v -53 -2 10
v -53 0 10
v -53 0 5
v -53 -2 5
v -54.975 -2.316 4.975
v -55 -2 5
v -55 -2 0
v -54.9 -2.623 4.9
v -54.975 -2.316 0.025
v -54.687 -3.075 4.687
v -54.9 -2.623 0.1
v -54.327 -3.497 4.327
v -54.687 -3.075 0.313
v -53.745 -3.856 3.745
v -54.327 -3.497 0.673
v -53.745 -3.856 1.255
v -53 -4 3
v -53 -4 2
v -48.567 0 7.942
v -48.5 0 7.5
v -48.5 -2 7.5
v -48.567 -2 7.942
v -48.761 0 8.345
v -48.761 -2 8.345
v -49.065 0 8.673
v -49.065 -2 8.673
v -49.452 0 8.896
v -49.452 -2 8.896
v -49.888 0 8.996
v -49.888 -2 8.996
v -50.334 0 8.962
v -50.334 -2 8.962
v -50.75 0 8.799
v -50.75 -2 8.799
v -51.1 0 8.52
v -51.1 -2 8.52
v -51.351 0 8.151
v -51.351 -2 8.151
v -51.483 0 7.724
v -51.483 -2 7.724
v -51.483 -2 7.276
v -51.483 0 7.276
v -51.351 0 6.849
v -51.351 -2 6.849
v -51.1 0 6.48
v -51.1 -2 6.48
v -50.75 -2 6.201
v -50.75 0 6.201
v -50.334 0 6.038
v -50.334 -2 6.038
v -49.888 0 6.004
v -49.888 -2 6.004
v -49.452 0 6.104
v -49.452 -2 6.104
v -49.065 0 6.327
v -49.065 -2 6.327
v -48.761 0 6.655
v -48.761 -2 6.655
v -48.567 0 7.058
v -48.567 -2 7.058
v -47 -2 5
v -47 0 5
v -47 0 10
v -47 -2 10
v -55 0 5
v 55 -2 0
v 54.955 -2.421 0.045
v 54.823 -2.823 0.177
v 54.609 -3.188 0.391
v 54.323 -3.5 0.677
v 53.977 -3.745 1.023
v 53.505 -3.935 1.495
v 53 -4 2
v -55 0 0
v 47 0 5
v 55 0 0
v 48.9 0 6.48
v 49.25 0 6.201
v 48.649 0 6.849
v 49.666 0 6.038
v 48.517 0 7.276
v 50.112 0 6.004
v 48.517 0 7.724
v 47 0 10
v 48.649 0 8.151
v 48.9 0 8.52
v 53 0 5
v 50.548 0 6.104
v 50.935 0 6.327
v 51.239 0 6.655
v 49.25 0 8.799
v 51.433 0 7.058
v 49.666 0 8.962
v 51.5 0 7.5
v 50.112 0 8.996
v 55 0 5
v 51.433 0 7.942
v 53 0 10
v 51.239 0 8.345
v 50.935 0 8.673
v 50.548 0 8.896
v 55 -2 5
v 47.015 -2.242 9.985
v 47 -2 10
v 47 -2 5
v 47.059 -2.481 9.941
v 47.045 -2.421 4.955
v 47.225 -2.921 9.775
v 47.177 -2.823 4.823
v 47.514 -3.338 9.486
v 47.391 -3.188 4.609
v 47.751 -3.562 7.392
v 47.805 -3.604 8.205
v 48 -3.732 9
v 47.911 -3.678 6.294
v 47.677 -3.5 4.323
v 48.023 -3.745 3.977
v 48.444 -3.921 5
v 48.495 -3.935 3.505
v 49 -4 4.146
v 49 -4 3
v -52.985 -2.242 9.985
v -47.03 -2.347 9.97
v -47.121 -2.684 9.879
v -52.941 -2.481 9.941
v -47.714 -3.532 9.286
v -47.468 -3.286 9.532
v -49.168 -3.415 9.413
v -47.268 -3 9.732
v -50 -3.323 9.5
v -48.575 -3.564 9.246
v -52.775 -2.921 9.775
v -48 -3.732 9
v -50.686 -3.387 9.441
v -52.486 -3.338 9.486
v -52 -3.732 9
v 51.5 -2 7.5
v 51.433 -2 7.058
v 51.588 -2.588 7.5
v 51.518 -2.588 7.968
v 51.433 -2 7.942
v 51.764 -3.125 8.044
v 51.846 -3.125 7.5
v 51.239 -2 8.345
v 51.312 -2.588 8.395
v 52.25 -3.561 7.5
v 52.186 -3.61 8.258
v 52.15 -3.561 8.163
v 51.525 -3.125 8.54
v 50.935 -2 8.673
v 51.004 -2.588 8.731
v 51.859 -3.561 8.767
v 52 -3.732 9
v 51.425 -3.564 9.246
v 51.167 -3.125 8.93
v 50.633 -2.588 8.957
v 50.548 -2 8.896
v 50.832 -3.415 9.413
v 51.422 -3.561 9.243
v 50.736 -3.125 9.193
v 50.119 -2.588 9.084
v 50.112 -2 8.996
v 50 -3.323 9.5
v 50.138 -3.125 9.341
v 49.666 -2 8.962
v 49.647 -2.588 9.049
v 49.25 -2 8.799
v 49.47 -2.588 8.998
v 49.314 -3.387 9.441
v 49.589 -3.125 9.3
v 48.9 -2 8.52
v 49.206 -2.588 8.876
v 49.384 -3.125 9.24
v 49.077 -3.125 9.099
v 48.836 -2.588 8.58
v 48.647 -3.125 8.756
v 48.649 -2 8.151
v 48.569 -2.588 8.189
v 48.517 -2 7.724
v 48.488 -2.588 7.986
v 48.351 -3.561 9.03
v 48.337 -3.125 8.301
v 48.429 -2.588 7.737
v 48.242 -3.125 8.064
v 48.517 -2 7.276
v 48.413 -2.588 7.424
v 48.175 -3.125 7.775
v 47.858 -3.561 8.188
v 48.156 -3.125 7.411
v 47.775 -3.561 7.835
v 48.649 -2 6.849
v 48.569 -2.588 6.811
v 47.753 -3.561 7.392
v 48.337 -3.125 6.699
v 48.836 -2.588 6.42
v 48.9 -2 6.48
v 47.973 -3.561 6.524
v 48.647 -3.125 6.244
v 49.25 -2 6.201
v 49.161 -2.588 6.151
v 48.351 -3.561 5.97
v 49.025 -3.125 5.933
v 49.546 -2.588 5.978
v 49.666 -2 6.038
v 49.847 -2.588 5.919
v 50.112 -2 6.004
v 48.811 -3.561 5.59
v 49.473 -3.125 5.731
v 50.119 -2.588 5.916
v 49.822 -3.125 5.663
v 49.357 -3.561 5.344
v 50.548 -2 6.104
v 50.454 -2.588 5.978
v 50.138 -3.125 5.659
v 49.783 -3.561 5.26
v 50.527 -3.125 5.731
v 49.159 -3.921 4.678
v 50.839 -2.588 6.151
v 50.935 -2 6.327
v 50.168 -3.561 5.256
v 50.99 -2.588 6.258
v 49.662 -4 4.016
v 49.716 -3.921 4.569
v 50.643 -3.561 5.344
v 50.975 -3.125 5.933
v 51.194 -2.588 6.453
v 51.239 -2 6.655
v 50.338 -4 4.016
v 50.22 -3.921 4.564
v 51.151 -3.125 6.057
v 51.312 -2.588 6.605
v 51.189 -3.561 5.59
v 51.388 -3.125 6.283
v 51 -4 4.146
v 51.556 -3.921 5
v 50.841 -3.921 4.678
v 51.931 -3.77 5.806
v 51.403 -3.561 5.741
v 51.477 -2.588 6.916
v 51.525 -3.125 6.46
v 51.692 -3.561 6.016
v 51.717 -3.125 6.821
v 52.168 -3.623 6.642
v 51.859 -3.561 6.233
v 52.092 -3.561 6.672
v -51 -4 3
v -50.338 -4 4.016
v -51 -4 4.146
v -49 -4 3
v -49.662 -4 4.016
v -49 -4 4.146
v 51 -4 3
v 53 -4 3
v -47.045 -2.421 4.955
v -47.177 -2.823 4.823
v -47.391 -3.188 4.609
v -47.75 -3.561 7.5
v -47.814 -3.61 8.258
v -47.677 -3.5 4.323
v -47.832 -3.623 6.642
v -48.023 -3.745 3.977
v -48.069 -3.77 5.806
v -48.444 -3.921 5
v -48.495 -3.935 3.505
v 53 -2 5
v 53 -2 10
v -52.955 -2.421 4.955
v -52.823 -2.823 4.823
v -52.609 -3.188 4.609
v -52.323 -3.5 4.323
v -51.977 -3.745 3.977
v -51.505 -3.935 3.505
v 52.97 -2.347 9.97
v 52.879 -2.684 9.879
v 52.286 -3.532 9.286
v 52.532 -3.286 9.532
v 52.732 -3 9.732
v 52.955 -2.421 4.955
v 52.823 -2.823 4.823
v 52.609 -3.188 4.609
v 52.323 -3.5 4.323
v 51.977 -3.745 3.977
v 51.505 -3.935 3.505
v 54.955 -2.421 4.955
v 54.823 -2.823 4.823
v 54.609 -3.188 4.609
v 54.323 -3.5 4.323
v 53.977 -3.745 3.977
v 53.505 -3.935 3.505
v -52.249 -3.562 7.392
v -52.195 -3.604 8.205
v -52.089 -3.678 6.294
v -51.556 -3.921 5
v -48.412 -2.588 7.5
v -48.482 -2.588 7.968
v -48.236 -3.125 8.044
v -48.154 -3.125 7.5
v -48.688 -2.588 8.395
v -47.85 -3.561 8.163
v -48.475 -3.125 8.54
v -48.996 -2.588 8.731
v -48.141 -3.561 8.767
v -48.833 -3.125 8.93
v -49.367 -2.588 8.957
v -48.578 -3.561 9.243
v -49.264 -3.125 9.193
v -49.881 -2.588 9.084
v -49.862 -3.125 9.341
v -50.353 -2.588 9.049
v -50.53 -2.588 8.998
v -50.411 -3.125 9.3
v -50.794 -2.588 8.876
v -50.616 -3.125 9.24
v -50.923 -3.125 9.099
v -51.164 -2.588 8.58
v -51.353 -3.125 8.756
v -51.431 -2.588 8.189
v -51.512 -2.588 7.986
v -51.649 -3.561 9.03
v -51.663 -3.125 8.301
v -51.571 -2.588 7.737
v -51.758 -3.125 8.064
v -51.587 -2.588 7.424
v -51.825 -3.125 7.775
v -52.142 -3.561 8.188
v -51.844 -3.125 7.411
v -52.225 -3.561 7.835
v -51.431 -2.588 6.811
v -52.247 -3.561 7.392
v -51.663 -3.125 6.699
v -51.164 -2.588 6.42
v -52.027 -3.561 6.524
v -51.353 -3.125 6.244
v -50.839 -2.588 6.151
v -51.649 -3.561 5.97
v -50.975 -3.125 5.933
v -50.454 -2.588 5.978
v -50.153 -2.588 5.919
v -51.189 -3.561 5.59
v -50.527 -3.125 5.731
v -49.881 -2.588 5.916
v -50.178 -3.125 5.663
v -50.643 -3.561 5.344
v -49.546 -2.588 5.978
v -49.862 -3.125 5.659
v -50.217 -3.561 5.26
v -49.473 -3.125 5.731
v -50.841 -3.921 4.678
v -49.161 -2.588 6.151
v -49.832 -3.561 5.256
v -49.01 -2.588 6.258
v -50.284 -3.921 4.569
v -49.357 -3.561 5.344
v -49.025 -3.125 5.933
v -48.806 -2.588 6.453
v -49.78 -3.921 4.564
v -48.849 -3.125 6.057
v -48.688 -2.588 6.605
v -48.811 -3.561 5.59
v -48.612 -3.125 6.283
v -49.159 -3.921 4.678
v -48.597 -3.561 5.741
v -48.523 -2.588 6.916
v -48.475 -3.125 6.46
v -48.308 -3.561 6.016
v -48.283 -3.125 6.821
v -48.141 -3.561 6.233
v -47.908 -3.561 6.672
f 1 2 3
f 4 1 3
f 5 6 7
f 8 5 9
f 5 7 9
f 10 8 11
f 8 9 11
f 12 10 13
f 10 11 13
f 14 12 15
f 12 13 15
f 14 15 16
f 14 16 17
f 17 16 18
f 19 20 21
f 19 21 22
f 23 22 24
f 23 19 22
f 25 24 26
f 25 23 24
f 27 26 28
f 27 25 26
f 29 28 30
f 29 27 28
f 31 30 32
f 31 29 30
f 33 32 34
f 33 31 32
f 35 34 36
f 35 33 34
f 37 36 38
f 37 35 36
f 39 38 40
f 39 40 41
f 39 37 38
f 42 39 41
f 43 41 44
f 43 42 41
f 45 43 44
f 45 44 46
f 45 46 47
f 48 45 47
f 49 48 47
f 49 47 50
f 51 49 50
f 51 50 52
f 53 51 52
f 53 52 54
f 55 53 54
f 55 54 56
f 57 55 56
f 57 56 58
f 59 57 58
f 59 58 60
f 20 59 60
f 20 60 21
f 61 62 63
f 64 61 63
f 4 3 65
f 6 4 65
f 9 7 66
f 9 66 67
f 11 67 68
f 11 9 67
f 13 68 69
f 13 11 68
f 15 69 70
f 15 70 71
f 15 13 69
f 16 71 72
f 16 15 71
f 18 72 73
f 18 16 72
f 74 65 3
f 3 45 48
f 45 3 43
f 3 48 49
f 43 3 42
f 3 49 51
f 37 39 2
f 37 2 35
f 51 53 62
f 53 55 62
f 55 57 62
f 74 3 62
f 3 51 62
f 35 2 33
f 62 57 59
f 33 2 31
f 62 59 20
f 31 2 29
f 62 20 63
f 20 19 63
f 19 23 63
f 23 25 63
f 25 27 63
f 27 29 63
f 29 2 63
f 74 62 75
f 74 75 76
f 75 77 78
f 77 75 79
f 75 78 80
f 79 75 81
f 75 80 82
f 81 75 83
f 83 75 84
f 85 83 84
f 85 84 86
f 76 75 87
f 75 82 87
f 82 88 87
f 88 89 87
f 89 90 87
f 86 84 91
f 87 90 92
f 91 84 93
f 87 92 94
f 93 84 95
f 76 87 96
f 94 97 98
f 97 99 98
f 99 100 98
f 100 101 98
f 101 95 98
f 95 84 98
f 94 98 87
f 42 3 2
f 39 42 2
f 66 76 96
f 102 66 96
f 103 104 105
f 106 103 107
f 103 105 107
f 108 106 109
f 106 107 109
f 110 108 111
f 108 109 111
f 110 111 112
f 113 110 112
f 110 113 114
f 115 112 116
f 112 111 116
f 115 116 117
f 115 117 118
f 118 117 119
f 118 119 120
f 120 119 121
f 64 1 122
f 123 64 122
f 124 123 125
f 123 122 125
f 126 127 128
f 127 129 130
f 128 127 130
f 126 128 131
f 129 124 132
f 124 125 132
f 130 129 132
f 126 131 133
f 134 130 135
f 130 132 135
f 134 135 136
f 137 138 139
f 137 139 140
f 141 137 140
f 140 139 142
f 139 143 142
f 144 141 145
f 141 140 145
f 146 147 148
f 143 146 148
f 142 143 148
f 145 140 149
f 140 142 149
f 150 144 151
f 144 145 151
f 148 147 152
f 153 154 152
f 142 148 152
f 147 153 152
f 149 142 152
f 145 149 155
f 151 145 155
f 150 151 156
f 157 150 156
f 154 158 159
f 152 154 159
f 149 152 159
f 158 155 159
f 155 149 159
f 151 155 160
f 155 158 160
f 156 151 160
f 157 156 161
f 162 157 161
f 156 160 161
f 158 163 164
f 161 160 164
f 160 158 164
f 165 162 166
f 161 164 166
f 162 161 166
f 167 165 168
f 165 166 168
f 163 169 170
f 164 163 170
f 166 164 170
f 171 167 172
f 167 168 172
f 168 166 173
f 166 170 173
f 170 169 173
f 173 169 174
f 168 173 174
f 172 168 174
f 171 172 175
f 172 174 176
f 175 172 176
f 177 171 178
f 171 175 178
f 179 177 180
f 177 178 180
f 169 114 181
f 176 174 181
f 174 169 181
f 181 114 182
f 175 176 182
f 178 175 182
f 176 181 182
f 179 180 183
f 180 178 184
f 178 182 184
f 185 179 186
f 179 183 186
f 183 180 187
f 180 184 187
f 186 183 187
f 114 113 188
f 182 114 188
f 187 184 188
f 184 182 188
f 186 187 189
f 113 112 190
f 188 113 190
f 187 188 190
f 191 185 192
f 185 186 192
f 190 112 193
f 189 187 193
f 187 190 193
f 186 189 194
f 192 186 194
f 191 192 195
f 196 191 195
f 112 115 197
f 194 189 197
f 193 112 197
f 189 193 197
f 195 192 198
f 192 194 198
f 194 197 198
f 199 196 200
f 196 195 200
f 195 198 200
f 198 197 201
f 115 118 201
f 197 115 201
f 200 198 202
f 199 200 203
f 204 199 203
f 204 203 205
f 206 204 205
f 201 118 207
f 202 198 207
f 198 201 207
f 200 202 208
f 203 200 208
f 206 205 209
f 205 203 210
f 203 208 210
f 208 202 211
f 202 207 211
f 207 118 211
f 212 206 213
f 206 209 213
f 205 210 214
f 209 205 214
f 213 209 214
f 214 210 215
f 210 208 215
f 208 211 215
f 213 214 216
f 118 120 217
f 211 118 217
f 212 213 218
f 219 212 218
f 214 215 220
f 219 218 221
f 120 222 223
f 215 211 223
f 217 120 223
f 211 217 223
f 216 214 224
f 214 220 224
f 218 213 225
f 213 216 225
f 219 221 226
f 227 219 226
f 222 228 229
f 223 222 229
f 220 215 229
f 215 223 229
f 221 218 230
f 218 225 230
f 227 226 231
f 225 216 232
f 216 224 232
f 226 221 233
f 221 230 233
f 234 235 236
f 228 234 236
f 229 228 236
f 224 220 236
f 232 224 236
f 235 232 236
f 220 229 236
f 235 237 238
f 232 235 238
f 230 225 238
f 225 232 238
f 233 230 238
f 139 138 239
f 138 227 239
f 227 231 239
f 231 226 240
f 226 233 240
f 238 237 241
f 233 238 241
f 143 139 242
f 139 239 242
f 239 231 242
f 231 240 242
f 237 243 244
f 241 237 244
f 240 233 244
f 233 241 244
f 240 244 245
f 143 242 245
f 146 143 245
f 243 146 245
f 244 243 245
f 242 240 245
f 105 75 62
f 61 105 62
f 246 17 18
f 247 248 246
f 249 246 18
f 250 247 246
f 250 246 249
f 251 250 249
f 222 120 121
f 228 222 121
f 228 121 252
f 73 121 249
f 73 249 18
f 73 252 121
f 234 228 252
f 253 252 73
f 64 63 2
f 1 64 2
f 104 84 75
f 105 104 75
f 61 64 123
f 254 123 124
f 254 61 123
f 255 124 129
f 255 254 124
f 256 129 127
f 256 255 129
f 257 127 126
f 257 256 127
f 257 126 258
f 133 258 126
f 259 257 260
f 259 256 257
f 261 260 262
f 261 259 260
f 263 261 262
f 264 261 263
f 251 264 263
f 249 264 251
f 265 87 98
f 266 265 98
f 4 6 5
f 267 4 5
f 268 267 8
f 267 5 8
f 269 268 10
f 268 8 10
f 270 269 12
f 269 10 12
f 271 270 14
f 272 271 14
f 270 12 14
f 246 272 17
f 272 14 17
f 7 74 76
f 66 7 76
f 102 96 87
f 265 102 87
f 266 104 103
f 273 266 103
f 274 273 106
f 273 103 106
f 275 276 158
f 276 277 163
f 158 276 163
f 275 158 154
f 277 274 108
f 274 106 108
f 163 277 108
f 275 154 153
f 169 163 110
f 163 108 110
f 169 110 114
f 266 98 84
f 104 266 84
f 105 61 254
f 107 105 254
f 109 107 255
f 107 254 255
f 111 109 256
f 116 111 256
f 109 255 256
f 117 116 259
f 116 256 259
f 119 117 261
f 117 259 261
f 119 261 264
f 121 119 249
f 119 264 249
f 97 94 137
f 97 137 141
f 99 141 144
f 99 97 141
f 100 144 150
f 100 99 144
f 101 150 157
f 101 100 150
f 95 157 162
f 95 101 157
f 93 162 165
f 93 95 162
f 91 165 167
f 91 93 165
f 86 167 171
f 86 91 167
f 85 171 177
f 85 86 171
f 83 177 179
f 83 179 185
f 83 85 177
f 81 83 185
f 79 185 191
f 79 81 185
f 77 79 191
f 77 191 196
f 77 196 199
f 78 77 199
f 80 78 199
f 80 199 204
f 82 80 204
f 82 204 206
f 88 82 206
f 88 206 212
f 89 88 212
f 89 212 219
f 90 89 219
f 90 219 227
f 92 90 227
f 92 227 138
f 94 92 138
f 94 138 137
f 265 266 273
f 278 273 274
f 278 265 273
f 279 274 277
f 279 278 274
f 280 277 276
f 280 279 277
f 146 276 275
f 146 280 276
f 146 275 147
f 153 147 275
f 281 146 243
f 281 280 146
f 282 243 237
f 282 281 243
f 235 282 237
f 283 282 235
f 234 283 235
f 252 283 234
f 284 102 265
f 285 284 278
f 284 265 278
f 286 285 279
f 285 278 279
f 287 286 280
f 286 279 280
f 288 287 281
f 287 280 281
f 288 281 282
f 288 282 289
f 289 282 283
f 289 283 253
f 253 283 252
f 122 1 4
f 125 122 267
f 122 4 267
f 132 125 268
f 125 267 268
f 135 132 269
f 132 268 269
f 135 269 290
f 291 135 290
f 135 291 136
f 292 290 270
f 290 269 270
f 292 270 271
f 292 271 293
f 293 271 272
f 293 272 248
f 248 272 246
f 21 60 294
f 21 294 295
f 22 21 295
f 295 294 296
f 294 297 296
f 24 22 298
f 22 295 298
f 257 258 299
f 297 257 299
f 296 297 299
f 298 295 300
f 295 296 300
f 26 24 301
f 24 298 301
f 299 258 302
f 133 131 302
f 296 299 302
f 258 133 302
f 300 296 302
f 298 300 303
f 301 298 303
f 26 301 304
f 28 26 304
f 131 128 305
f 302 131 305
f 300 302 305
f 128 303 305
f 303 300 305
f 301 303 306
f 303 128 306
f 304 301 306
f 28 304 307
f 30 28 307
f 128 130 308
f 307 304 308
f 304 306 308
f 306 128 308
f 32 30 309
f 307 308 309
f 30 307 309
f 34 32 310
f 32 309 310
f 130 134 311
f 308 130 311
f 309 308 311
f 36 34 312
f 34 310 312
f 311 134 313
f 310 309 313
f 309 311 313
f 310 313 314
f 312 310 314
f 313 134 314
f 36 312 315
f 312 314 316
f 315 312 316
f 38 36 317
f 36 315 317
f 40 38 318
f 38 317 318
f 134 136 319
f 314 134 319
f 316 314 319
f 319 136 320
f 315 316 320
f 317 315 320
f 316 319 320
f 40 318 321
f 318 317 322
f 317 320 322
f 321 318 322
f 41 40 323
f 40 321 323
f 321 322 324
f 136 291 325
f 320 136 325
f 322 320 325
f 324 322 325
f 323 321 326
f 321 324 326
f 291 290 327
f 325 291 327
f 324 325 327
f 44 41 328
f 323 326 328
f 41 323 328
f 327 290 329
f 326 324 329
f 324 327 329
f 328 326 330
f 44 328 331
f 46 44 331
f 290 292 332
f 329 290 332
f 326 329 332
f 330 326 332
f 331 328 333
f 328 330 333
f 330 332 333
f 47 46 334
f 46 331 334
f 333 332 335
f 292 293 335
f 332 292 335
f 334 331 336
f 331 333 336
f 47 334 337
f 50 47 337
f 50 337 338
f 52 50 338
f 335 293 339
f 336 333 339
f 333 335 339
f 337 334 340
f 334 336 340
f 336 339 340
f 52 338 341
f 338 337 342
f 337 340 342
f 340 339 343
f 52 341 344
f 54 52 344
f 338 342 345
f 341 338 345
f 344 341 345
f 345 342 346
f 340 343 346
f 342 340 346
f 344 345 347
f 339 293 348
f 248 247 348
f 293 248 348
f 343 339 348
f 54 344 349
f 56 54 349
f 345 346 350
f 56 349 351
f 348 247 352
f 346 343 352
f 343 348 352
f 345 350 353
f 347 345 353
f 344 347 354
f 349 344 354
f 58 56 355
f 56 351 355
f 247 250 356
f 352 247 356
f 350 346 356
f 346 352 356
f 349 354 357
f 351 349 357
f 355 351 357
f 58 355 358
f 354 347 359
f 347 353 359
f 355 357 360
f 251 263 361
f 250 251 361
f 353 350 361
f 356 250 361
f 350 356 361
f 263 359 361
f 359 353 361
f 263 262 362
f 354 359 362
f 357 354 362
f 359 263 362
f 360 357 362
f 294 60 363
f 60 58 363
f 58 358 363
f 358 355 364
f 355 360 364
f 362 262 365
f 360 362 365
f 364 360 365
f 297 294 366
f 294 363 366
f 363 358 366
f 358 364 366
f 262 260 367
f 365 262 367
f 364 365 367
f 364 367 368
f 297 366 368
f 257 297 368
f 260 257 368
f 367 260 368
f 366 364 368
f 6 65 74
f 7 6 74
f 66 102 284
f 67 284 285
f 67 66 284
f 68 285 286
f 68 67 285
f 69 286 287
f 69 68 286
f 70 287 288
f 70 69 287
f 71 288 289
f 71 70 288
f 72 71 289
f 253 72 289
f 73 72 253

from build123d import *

# Parameters (mm, degrees)
F0_R         = 1.5
F1_DEPTH     = 4
F2_T1_DEPTH  = 15
F2_T3_DEPTH  = 120
F2_T5_DEPTH  = 7
F2_T7_DEPTH  = 10
F2_T9_DEPTH  = 16
F2_T11_DEPTH = 94
F2_T13_DEPTH = 16
F2_T15_DEPTH = 7
F2_T25_DEPTH = 12
F2_T29_DEPTH = 15
F2_T36_DEPTH = 15
F2_T40_DEPTH = 99
F2_T47_DEPTH = 99
F2_T51_DEPTH = 15
F2_T58_DEPTH = 15
F2_T62_DEPTH = 12


# Not quite as in the source:
# - a fillet or chamfer that OpenCascade refuses, or shapes differently, is made with other operations: its cross-section is extruded or revolved along the edge and cut away or added


with BuildPart() as f1:
    # F0 (on Front) → F1 (new body)
    with BuildSketch(Plane.XZ):
        Polygon((-55, 5), (-55, 0), (55, 0), (55, 5), (53, 5), (53, 10), (47, 10), (47, 5), (-47, 5), (-47, 10), (-53, 10), (-53, 5), align=None)
        with Locations((-50, 7.5)):
            Circle(F0_R, mode=Mode.SUBTRACT)
        with Locations((50, 7.5)):
            Circle(F0_R, mode=Mode.SUBTRACT)
    extrude(amount=F1_DEPTH)

    # F2: fillet of radius 2 on 14 edges, made by hand

    # F2_s2 → F2_t1 (cut)
    with BuildSketch(Plane.XY.offset(-5)):
        with BuildLine():
            ThreePointArc((-55, -2), (-54.4142135624, -3.4142135624), (-53, -4))
            Line((-53, -4), (-55, -4))
            Line((-55, -4), (-55, -2))
        make_face()
        with BuildLine():
            ThreePointArc((55, -2), (54.4142135624, -3.4142135624), (53, -4))
            Line((53, -4), (55, -4))
            Line((55, -4), (55, -2))
        make_face()
    extrude(amount=F2_T1_DEPTH, mode=Mode.SUBTRACT)

    # F2_s4 → F2_t3 (cut)
    with BuildSketch(Plane.YZ.offset(-60)):
        with BuildLine():
            ThreePointArc((-2, 0), (-3.4142135624, 0.5857864376), (-4, 2))
            Line((-4, 2), (-4, 0))
            Line((-4, 0), (-2, 0))
        make_face()
    extrude(amount=F2_T3_DEPTH, mode=Mode.SUBTRACT)

    # F2_s6 → F2_t5 (cut)
    with BuildSketch(Plane.YZ.offset(53)):
        with BuildLine():
            ThreePointArc((-2, 5), (-3.4142135624, 4.4142135624), (-4, 3))
            Line((-4, 3), (-4, 5))
            Line((-4, 5), (-2, 5))
        make_face()
    extrude(amount=F2_T5_DEPTH, mode=Mode.SUBTRACT)

    # F2_s8 → F2_t7 (cut)
    with BuildSketch(Plane.XY.offset(5)):
        with BuildLine():
            ThreePointArc((53, -2), (52.4142135624, -3.4142135624), (51, -4))
            Line((51, -4), (53, -4))
            Line((53, -4), (53, -2))
        make_face()
        with BuildLine():
            ThreePointArc((47, -2), (47.5857864376, -3.4142135624), (49, -4))
            Line((49, -4), (47, -4))
            Line((47, -4), (47, -2))
        make_face()
        with BuildLine():
            ThreePointArc((-47, -2), (-47.5857864376, -3.4142135624), (-49, -4))
            Line((-49, -4), (-47, -4))
            Line((-47, -4), (-47, -2))
        make_face()
        with BuildLine():
            ThreePointArc((-53, -2), (-52.4142135624, -3.4142135624), (-51, -4))
            Line((-51, -4), (-53, -4))
            Line((-53, -4), (-53, -2))
        make_face()
    extrude(amount=F2_T7_DEPTH, mode=Mode.SUBTRACT)

    # F2_s10 → F2_t9 (cut)
    with BuildSketch(Plane.YZ.offset(42)):
        with BuildLine():
            ThreePointArc((-2, 10), (-3.4142135624, 9.4142135624), (-4, 8))
            Line((-4, 8), (-4, 10))
            Line((-4, 10), (-2, 10))
        make_face()
    extrude(amount=F2_T9_DEPTH, mode=Mode.SUBTRACT)

    # F2_s12 → F2_t11 (cut)
    with BuildSketch(Plane.YZ.offset(-47)):
        with BuildLine():
            ThreePointArc((-2, 5), (-3.4142135624, 4.4142135624), (-4, 3))
            Line((-4, 3), (-4, 5))
            Line((-4, 5), (-2, 5))
        make_face()
    extrude(amount=F2_T11_DEPTH, mode=Mode.SUBTRACT)

    # F2_s14 → F2_t13 (cut)
    with BuildSketch(Plane.YZ.offset(-58)):
        with BuildLine():
            ThreePointArc((-2, 10), (-3.4142135624, 9.4142135624), (-4, 8))
            Line((-4, 8), (-4, 10))
            Line((-4, 10), (-2, 10))
        make_face()
    extrude(amount=F2_T13_DEPTH, mode=Mode.SUBTRACT)

    # F2_s16 → F2_t15 (cut)
    with BuildSketch(Plane.YZ.offset(-60)):
        with BuildLine():
            ThreePointArc((-2, 5), (-3.4142135624, 4.4142135624), (-4, 3))
            Line((-4, 3), (-4, 5))
            Line((-4, 5), (-2, 5))
        make_face()
    extrude(amount=F2_T15_DEPTH, mode=Mode.SUBTRACT)

    # F2_s17 → F2_t18 (revolve, cut)
    with BuildSketch(Plane.XY.offset(7.5)):
        with BuildLine():
            ThreePointArc((-48.5, -2), (-47.9142135624, -3.4142135624), (-46.5, -4))
            Line((-46.5, -4), (-48.5, -4))
            Line((-48.5, -4), (-48.5, -2))
        make_face()
    revolve(axis=Axis((-50, -4, 7.5), (0, -1, 0)), mode=Mode.SUBTRACT)

    # F2_s19 → F2_t20 (revolve, cut)
    with BuildSketch(Plane.XY.offset(7.5)):
        with BuildLine():
            ThreePointArc((51.5, -2), (52.0857864376, -3.4142135624), (53.5, -4))
            Line((53.5, -4), (51.5, -4))
            Line((51.5, -4), (51.5, -2))
        make_face()
    revolve(axis=Axis((50, -4, 7.5), (0, -1, 0)), mode=Mode.SUBTRACT)


with BuildPart() as f2_tool23:
    # F2_s24 → F2_t25 (new body)
    with BuildSketch(Plane.YZ.offset(60)):
        with BuildLine():
            ThreePointArc((-2, 5), (-3.4142135624, 4.4142135624), (-4, 3))
            Line((-4, 3), (-4, 5))
            Line((-4, 5), (-2, 5))
        make_face()
    extrude(amount=-F2_T25_DEPTH)

    split(bisect_by=Plane.YZ.offset(53), keep=Keep.BOTTOM)


with BuildPart() as f2_tool27:
    # F2_s28 → F2_t29 (new body)
    with BuildSketch(Plane.XY):
        with BuildLine():
            ThreePointArc((53, -2), (52.4142135624, -3.4142135624), (51, -4))
            Line((51, -4), (53, -4))
            Line((53, -4), (53, -2))
        make_face()
    extrude(amount=F2_T29_DEPTH)

    split(bisect_by=Plane.XY.offset(5), keep=Keep.BOTTOM)


with BuildPart() as f2_tool23_1:
    add(f2_tool23.part)

    # F2_t31: intersect F2_tool27
    add(f2_tool27.part, mode=Mode.INTERSECT)


with BuildPart() as f1_1:
    add(f1.part)

    # F2_t21: cut F2_tool23
    add(f2_tool23_1.part, mode=Mode.SUBTRACT)


with BuildPart() as f2_tool34:
    # F2_s35 → F2_t36 (new body)
    with BuildSketch(Plane.XY.offset(15)):
        with BuildLine():
            ThreePointArc((47, -2), (47.5857864376, -3.4142135624), (49, -4))
            Line((49, -4), (47, -4))
            Line((47, -4), (47, -2))
        make_face()
    extrude(amount=-F2_T36_DEPTH)

    split(bisect_by=Plane.XY.offset(5), keep=Keep.BOTTOM)


with BuildPart() as f2_tool38:
    # F2_s39 → F2_t40 (new body)
    with BuildSketch(Plane.YZ.offset(52)):
        with BuildLine():
            ThreePointArc((-2, 5), (-3.4142135624, 4.4142135624), (-4, 3))
            Line((-4, 3), (-4, 5))
            Line((-4, 5), (-2, 5))
        make_face()
    extrude(amount=-F2_T40_DEPTH)

    split(bisect_by=Plane.YZ.offset(47), keep=Keep.TOP)


with BuildPart() as f2_tool34_1:
    add(f2_tool34.part)

    # F2_t42: intersect F2_tool38
    add(f2_tool38.part, mode=Mode.INTERSECT)


with BuildPart() as f1_2:
    add(f1_1.part)

    # F2_t32: cut F2_tool34
    add(f2_tool34_1.part, mode=Mode.SUBTRACT)


with BuildPart() as f2_tool45:
    # F2_s46 → F2_t47 (new body)
    with BuildSketch(Plane.YZ.offset(47)):
        with BuildLine():
            ThreePointArc((-2, 5), (-3.4142135624, 4.4142135624), (-4, 3))
            Line((-4, 3), (-4, 5))
            Line((-4, 5), (-2, 5))
        make_face()
    extrude(amount=-F2_T47_DEPTH)

    split(bisect_by=Plane.YZ.offset(-47), keep=Keep.BOTTOM)


with BuildPart() as f2_tool49:
    # F2_s50 → F2_t51 (new body)
    with BuildSketch(Plane.XY):
        with BuildLine():
            ThreePointArc((-47, -2), (-47.5857864376, -3.4142135624), (-49, -4))
            Line((-49, -4), (-47, -4))
            Line((-47, -4), (-47, -2))
        make_face()
    extrude(amount=F2_T51_DEPTH)

    split(bisect_by=Plane.XY.offset(5), keep=Keep.BOTTOM)


with BuildPart() as f2_tool45_1:
    add(f2_tool45.part)

    # F2_t53: intersect F2_tool49
    add(f2_tool49.part, mode=Mode.INTERSECT)


with BuildPart() as f1_3:
    add(f1_2.part)

    # F2_t43: cut F2_tool45
    add(f2_tool45_1.part, mode=Mode.SUBTRACT)


with BuildPart() as f2_tool56:
    # F2_s57 → F2_t58 (new body)
    with BuildSketch(Plane.XY.offset(15)):
        with BuildLine():
            ThreePointArc((-53, -2), (-52.4142135624, -3.4142135624), (-51, -4))
            Line((-51, -4), (-53, -4))
            Line((-53, -4), (-53, -2))
        make_face()
    extrude(amount=-F2_T58_DEPTH)

    split(bisect_by=Plane.XY.offset(5), keep=Keep.BOTTOM)


with BuildPart() as f2_tool60:
    # F2_s61 → F2_t62 (new body)
    with BuildSketch(Plane.YZ.offset(-48)):
        with BuildLine():
            ThreePointArc((-2, 5), (-3.4142135624, 4.4142135624), (-4, 3))
            Line((-4, 3), (-4, 5))
            Line((-4, 5), (-2, 5))
        make_face()
    extrude(amount=-F2_T62_DEPTH)

    split(bisect_by=Plane.YZ.offset(-53), keep=Keep.TOP)


with BuildPart() as f2_tool56_1:
    add(f2_tool56.part)

    # F2_t64: intersect F2_tool60
    add(f2_tool60.part, mode=Mode.INTERSECT)


with BuildPart() as f1_4:
    add(f1_3.part)

    # F2_t54: cut F2_tool56
    add(f2_tool56_1.part, mode=Mode.SUBTRACT)


solid = f1_4.part
